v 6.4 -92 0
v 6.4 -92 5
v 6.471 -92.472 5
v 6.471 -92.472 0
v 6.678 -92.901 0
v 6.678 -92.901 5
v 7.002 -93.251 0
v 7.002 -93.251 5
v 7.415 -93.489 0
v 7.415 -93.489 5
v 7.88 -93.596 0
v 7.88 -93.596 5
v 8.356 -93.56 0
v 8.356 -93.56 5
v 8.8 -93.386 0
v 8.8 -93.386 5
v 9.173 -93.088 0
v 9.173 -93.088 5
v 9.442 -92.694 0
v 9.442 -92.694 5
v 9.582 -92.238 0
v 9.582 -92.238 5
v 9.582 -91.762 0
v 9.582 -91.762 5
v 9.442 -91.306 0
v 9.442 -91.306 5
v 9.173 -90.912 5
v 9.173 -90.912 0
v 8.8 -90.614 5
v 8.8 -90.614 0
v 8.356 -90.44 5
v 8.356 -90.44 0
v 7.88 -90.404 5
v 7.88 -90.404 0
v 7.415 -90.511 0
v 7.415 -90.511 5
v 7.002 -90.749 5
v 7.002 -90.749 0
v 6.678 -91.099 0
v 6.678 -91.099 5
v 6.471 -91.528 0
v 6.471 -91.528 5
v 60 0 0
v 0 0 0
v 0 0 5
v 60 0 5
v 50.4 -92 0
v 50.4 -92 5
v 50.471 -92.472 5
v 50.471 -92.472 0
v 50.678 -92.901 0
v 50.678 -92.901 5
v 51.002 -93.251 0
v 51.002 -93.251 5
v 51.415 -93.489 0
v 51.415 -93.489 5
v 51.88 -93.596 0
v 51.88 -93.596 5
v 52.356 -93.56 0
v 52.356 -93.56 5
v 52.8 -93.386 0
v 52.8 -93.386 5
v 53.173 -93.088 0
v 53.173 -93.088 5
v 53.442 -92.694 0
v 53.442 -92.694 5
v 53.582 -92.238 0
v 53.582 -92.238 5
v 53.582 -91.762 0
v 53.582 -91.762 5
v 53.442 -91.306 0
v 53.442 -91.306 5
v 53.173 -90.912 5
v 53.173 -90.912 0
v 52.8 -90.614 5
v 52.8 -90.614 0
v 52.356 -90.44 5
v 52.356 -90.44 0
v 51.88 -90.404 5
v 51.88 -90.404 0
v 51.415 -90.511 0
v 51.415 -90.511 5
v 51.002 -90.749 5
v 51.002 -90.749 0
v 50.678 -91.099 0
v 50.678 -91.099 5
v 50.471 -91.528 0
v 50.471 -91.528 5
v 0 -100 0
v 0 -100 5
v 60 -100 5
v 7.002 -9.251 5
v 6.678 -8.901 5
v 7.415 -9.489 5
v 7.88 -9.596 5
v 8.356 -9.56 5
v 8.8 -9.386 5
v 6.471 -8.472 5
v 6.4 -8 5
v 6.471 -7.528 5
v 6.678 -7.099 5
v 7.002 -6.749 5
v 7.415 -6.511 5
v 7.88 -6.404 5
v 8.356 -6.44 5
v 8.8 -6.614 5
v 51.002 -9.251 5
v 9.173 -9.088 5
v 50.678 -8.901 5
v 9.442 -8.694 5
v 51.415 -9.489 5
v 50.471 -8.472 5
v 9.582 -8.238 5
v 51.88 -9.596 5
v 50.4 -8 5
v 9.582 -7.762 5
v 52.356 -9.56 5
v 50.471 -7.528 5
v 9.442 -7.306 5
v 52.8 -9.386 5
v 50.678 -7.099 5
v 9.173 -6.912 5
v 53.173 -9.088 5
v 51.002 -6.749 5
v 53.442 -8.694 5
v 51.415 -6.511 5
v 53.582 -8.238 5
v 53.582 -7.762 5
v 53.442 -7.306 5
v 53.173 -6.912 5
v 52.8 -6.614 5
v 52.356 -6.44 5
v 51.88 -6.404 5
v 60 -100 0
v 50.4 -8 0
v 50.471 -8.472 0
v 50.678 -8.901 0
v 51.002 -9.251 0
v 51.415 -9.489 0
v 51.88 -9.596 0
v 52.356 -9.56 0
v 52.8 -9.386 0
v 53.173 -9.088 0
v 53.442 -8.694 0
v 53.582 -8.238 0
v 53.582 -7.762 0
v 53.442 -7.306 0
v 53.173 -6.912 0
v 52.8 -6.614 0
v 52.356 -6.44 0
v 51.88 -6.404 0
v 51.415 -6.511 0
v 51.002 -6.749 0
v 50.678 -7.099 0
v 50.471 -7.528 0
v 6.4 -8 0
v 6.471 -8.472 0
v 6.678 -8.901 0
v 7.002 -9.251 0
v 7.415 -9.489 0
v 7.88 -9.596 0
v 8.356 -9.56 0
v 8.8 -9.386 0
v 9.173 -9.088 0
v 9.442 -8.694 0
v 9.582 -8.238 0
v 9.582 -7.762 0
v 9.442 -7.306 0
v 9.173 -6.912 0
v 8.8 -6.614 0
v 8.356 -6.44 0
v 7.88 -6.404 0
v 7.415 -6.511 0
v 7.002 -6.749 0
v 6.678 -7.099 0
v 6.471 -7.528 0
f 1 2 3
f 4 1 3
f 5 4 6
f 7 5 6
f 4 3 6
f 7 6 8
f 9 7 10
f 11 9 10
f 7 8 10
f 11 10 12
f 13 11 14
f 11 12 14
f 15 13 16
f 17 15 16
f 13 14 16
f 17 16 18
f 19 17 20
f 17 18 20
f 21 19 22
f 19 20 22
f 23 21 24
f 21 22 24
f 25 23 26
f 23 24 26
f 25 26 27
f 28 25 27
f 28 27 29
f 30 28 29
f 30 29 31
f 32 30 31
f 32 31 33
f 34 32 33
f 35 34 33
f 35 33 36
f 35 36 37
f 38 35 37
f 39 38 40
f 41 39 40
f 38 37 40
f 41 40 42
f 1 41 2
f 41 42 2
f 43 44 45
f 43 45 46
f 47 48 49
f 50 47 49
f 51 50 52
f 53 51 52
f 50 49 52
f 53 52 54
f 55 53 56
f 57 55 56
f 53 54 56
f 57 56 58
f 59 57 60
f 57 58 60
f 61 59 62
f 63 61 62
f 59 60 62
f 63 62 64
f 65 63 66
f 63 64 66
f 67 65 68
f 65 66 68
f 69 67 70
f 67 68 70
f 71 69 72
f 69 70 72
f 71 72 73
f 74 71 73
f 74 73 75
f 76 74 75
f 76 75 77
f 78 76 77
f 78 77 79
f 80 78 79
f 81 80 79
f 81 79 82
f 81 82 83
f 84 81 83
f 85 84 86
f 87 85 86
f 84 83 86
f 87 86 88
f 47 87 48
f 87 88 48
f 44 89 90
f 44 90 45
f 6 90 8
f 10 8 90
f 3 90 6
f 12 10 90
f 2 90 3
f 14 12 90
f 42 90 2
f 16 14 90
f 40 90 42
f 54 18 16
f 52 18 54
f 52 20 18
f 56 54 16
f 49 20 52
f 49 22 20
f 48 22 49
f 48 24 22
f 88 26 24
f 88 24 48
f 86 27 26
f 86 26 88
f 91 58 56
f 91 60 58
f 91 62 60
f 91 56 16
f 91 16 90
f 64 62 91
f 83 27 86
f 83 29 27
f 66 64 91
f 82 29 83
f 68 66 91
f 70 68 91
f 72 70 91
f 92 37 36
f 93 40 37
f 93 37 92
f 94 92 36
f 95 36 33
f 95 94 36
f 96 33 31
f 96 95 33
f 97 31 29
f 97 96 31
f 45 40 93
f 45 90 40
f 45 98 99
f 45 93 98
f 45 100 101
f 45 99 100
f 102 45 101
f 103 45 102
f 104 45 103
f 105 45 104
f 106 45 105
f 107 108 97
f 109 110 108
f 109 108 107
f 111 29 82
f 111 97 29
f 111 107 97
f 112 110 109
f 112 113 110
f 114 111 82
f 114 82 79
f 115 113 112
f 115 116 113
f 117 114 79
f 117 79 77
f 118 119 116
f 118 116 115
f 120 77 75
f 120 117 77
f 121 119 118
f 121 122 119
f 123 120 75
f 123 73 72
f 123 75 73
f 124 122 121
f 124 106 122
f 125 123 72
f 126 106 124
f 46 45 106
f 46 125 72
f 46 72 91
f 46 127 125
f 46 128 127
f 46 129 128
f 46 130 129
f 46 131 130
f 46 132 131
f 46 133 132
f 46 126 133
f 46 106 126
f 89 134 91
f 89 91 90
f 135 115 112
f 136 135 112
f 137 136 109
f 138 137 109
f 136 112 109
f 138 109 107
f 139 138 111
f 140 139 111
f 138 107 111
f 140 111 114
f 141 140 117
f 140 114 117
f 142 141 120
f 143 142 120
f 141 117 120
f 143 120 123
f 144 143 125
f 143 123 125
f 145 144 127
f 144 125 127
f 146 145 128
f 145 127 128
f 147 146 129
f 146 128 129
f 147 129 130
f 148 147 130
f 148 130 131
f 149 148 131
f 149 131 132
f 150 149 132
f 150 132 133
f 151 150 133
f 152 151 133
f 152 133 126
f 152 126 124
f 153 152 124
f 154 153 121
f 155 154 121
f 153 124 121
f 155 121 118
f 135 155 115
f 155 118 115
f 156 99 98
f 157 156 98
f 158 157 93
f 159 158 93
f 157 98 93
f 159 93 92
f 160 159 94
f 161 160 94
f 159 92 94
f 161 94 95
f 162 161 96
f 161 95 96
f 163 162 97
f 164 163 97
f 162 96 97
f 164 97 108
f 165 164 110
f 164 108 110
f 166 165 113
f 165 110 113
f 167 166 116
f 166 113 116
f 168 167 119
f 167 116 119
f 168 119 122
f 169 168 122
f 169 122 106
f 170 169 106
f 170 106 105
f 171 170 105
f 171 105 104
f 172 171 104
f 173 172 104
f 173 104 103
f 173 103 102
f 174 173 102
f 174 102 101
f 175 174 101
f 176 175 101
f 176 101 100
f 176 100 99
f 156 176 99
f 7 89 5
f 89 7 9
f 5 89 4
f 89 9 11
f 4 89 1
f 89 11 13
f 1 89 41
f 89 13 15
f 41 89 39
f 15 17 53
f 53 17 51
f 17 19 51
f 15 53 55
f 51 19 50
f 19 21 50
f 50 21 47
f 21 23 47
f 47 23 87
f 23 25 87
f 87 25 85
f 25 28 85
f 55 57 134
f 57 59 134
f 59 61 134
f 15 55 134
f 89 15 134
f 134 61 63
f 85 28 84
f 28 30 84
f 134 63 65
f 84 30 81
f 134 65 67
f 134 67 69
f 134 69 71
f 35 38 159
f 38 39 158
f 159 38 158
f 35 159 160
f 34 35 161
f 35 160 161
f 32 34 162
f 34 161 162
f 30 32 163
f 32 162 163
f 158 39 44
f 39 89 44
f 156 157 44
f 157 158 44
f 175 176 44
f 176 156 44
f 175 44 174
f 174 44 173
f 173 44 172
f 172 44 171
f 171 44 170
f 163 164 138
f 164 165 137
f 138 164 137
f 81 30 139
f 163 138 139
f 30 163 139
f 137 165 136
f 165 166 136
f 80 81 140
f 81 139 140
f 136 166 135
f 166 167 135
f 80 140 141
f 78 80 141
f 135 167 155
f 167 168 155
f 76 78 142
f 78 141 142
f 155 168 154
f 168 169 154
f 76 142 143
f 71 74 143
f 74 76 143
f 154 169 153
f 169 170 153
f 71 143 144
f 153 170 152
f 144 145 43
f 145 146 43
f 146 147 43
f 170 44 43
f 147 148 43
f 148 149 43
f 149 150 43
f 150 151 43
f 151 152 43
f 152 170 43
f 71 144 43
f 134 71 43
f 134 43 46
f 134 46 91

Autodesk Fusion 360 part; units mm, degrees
sketch "草图1" plane through (0, 0, 0) normal (0, 0, 1) x (1, 0, 0)
  line L0 (0, 0) -> (60, 0)
  line L1 (60, 0) -> (60, -100)
  line L2 (60, -100) -> (0, -100)
  line L3 (0, -100) -> (0, 0)
  dimension "d1" = 60
  dimension "d2" = 100
extrude "拉伸1" add sketch "草图1" along normal blind 5
sketch "草图2" plane through (0, 0, 5) normal (0, 0, 1) x (-1, 0, 0)
  line L0 (0, 100) -> (-60, 100)
  line L1 (-60, 100) -> (-60, 0)
  line L2 (-60, 0) -> (0, 0)
  line L3 (0, 0) -> (0, 100)
  circle A0 centre (-8, 8) radius 1.6
  circle A1 centre (-52, 8) radius 1.6
  circle A2 centre (-8, 92) radius 1.6
  circle A3 centre (-52, 92) radius 1.6
  dimension "d5" = 3.2
  dimension "d6" = 8
  dimension "d7" = 8
  dimension "d14" = -44
  dimension "d15" = 84
extrude "拉伸2" cut sketch "草图2" against normal blind 5 contours A0 | A1 | A2 | A3
